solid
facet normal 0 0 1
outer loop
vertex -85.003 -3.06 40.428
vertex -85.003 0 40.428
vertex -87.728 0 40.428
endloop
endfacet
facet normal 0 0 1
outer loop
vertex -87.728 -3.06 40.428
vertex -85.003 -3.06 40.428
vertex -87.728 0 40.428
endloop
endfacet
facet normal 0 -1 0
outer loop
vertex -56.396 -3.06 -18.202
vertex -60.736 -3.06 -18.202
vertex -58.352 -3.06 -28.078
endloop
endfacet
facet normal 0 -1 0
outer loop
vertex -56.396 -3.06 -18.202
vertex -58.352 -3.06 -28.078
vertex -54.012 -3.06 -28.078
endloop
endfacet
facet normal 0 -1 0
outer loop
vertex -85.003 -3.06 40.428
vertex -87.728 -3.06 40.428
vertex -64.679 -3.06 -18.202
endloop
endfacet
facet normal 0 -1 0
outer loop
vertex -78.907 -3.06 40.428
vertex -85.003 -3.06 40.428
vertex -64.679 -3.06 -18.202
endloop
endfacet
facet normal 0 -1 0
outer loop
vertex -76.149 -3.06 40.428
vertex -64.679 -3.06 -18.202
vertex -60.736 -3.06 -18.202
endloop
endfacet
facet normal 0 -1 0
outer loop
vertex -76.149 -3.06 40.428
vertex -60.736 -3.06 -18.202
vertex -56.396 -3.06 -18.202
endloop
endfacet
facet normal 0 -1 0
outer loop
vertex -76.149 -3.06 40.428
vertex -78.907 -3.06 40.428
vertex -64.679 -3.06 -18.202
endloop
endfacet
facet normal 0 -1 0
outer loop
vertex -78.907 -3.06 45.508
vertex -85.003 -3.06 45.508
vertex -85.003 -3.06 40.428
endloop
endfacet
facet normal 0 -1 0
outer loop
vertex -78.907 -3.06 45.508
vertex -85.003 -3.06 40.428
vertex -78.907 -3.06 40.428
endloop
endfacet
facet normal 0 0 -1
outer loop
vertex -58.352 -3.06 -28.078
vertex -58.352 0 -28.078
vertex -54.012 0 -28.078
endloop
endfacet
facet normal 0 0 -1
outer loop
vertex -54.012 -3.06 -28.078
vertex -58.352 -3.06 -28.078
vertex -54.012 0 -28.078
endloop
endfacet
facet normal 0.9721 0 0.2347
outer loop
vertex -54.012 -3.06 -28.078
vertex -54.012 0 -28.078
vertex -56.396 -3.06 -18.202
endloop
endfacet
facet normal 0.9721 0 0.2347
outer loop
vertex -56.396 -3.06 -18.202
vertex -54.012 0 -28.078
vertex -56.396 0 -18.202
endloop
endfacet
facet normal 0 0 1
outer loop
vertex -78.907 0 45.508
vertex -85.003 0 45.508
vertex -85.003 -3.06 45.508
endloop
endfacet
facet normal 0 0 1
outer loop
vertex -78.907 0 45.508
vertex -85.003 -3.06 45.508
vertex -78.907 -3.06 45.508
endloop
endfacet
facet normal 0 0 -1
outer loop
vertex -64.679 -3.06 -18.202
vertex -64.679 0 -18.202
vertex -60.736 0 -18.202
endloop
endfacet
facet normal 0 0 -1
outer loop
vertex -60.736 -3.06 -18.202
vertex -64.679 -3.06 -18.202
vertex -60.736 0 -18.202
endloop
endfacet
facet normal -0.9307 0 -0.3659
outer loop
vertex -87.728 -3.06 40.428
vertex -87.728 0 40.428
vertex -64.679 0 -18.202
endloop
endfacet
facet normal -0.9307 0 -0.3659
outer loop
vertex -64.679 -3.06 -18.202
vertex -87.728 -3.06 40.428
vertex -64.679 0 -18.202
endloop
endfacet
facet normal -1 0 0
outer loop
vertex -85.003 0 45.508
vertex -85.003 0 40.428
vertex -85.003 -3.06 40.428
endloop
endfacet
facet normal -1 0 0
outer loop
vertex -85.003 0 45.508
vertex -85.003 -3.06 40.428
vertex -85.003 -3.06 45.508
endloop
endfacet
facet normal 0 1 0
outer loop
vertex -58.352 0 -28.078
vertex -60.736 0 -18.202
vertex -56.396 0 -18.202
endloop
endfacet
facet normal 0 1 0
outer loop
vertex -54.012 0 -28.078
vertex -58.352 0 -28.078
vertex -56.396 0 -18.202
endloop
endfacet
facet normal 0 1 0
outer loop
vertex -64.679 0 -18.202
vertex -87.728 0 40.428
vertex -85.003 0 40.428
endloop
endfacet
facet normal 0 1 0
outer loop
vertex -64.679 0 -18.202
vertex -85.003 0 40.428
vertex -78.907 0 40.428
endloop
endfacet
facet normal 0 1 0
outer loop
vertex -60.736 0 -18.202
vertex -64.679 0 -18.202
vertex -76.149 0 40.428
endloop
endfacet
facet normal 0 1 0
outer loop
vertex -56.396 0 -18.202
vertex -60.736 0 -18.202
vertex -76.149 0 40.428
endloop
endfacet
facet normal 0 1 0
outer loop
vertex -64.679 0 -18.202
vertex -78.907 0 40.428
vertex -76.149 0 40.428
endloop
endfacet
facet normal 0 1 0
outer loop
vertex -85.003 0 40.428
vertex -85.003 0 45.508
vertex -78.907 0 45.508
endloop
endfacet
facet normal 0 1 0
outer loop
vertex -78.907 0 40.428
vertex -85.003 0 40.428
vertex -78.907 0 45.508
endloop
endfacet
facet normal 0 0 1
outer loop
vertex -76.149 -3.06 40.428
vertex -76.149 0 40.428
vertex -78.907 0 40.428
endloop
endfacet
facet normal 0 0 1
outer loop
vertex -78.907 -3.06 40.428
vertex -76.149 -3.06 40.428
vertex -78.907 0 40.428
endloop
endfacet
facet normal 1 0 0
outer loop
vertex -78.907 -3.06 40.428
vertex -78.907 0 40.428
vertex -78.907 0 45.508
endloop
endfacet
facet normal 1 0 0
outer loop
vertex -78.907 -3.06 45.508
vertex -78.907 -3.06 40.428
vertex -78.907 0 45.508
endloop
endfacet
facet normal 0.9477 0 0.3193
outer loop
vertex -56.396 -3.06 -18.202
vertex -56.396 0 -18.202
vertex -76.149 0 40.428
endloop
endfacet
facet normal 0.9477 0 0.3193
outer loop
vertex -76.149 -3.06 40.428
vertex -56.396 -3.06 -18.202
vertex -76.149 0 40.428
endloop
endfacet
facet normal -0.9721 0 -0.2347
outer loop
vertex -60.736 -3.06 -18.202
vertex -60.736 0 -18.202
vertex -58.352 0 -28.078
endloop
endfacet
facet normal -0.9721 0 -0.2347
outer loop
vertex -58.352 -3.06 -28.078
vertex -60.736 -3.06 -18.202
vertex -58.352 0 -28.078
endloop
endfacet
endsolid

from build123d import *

# Parameters (mm, degrees)
F0_W     = 6.096
F0_H     = 5.08
F1_DEPTH = 3.06


with BuildPart() as f1:
    # F0 (on Front) → F1 (new body)
    with BuildSketch(Plane.XZ):
        Polygon((-64.67925, -18.20163), (-60.735819, -18.20163), (-58.351868, -28.077984), (-54.011868, -28.077984), (-56.395819, -18.20163), (-76.14853, 40.42821), (-78.907189, 40.42821), (-85.003189, 40.42821), (-87.727705, 40.42821), align=None)
        with Locations((-81.955189, 42.96821)):
            Rectangle(F0_W, F0_H)
    extrude(amount=F1_DEPTH)


solid = f1.part
